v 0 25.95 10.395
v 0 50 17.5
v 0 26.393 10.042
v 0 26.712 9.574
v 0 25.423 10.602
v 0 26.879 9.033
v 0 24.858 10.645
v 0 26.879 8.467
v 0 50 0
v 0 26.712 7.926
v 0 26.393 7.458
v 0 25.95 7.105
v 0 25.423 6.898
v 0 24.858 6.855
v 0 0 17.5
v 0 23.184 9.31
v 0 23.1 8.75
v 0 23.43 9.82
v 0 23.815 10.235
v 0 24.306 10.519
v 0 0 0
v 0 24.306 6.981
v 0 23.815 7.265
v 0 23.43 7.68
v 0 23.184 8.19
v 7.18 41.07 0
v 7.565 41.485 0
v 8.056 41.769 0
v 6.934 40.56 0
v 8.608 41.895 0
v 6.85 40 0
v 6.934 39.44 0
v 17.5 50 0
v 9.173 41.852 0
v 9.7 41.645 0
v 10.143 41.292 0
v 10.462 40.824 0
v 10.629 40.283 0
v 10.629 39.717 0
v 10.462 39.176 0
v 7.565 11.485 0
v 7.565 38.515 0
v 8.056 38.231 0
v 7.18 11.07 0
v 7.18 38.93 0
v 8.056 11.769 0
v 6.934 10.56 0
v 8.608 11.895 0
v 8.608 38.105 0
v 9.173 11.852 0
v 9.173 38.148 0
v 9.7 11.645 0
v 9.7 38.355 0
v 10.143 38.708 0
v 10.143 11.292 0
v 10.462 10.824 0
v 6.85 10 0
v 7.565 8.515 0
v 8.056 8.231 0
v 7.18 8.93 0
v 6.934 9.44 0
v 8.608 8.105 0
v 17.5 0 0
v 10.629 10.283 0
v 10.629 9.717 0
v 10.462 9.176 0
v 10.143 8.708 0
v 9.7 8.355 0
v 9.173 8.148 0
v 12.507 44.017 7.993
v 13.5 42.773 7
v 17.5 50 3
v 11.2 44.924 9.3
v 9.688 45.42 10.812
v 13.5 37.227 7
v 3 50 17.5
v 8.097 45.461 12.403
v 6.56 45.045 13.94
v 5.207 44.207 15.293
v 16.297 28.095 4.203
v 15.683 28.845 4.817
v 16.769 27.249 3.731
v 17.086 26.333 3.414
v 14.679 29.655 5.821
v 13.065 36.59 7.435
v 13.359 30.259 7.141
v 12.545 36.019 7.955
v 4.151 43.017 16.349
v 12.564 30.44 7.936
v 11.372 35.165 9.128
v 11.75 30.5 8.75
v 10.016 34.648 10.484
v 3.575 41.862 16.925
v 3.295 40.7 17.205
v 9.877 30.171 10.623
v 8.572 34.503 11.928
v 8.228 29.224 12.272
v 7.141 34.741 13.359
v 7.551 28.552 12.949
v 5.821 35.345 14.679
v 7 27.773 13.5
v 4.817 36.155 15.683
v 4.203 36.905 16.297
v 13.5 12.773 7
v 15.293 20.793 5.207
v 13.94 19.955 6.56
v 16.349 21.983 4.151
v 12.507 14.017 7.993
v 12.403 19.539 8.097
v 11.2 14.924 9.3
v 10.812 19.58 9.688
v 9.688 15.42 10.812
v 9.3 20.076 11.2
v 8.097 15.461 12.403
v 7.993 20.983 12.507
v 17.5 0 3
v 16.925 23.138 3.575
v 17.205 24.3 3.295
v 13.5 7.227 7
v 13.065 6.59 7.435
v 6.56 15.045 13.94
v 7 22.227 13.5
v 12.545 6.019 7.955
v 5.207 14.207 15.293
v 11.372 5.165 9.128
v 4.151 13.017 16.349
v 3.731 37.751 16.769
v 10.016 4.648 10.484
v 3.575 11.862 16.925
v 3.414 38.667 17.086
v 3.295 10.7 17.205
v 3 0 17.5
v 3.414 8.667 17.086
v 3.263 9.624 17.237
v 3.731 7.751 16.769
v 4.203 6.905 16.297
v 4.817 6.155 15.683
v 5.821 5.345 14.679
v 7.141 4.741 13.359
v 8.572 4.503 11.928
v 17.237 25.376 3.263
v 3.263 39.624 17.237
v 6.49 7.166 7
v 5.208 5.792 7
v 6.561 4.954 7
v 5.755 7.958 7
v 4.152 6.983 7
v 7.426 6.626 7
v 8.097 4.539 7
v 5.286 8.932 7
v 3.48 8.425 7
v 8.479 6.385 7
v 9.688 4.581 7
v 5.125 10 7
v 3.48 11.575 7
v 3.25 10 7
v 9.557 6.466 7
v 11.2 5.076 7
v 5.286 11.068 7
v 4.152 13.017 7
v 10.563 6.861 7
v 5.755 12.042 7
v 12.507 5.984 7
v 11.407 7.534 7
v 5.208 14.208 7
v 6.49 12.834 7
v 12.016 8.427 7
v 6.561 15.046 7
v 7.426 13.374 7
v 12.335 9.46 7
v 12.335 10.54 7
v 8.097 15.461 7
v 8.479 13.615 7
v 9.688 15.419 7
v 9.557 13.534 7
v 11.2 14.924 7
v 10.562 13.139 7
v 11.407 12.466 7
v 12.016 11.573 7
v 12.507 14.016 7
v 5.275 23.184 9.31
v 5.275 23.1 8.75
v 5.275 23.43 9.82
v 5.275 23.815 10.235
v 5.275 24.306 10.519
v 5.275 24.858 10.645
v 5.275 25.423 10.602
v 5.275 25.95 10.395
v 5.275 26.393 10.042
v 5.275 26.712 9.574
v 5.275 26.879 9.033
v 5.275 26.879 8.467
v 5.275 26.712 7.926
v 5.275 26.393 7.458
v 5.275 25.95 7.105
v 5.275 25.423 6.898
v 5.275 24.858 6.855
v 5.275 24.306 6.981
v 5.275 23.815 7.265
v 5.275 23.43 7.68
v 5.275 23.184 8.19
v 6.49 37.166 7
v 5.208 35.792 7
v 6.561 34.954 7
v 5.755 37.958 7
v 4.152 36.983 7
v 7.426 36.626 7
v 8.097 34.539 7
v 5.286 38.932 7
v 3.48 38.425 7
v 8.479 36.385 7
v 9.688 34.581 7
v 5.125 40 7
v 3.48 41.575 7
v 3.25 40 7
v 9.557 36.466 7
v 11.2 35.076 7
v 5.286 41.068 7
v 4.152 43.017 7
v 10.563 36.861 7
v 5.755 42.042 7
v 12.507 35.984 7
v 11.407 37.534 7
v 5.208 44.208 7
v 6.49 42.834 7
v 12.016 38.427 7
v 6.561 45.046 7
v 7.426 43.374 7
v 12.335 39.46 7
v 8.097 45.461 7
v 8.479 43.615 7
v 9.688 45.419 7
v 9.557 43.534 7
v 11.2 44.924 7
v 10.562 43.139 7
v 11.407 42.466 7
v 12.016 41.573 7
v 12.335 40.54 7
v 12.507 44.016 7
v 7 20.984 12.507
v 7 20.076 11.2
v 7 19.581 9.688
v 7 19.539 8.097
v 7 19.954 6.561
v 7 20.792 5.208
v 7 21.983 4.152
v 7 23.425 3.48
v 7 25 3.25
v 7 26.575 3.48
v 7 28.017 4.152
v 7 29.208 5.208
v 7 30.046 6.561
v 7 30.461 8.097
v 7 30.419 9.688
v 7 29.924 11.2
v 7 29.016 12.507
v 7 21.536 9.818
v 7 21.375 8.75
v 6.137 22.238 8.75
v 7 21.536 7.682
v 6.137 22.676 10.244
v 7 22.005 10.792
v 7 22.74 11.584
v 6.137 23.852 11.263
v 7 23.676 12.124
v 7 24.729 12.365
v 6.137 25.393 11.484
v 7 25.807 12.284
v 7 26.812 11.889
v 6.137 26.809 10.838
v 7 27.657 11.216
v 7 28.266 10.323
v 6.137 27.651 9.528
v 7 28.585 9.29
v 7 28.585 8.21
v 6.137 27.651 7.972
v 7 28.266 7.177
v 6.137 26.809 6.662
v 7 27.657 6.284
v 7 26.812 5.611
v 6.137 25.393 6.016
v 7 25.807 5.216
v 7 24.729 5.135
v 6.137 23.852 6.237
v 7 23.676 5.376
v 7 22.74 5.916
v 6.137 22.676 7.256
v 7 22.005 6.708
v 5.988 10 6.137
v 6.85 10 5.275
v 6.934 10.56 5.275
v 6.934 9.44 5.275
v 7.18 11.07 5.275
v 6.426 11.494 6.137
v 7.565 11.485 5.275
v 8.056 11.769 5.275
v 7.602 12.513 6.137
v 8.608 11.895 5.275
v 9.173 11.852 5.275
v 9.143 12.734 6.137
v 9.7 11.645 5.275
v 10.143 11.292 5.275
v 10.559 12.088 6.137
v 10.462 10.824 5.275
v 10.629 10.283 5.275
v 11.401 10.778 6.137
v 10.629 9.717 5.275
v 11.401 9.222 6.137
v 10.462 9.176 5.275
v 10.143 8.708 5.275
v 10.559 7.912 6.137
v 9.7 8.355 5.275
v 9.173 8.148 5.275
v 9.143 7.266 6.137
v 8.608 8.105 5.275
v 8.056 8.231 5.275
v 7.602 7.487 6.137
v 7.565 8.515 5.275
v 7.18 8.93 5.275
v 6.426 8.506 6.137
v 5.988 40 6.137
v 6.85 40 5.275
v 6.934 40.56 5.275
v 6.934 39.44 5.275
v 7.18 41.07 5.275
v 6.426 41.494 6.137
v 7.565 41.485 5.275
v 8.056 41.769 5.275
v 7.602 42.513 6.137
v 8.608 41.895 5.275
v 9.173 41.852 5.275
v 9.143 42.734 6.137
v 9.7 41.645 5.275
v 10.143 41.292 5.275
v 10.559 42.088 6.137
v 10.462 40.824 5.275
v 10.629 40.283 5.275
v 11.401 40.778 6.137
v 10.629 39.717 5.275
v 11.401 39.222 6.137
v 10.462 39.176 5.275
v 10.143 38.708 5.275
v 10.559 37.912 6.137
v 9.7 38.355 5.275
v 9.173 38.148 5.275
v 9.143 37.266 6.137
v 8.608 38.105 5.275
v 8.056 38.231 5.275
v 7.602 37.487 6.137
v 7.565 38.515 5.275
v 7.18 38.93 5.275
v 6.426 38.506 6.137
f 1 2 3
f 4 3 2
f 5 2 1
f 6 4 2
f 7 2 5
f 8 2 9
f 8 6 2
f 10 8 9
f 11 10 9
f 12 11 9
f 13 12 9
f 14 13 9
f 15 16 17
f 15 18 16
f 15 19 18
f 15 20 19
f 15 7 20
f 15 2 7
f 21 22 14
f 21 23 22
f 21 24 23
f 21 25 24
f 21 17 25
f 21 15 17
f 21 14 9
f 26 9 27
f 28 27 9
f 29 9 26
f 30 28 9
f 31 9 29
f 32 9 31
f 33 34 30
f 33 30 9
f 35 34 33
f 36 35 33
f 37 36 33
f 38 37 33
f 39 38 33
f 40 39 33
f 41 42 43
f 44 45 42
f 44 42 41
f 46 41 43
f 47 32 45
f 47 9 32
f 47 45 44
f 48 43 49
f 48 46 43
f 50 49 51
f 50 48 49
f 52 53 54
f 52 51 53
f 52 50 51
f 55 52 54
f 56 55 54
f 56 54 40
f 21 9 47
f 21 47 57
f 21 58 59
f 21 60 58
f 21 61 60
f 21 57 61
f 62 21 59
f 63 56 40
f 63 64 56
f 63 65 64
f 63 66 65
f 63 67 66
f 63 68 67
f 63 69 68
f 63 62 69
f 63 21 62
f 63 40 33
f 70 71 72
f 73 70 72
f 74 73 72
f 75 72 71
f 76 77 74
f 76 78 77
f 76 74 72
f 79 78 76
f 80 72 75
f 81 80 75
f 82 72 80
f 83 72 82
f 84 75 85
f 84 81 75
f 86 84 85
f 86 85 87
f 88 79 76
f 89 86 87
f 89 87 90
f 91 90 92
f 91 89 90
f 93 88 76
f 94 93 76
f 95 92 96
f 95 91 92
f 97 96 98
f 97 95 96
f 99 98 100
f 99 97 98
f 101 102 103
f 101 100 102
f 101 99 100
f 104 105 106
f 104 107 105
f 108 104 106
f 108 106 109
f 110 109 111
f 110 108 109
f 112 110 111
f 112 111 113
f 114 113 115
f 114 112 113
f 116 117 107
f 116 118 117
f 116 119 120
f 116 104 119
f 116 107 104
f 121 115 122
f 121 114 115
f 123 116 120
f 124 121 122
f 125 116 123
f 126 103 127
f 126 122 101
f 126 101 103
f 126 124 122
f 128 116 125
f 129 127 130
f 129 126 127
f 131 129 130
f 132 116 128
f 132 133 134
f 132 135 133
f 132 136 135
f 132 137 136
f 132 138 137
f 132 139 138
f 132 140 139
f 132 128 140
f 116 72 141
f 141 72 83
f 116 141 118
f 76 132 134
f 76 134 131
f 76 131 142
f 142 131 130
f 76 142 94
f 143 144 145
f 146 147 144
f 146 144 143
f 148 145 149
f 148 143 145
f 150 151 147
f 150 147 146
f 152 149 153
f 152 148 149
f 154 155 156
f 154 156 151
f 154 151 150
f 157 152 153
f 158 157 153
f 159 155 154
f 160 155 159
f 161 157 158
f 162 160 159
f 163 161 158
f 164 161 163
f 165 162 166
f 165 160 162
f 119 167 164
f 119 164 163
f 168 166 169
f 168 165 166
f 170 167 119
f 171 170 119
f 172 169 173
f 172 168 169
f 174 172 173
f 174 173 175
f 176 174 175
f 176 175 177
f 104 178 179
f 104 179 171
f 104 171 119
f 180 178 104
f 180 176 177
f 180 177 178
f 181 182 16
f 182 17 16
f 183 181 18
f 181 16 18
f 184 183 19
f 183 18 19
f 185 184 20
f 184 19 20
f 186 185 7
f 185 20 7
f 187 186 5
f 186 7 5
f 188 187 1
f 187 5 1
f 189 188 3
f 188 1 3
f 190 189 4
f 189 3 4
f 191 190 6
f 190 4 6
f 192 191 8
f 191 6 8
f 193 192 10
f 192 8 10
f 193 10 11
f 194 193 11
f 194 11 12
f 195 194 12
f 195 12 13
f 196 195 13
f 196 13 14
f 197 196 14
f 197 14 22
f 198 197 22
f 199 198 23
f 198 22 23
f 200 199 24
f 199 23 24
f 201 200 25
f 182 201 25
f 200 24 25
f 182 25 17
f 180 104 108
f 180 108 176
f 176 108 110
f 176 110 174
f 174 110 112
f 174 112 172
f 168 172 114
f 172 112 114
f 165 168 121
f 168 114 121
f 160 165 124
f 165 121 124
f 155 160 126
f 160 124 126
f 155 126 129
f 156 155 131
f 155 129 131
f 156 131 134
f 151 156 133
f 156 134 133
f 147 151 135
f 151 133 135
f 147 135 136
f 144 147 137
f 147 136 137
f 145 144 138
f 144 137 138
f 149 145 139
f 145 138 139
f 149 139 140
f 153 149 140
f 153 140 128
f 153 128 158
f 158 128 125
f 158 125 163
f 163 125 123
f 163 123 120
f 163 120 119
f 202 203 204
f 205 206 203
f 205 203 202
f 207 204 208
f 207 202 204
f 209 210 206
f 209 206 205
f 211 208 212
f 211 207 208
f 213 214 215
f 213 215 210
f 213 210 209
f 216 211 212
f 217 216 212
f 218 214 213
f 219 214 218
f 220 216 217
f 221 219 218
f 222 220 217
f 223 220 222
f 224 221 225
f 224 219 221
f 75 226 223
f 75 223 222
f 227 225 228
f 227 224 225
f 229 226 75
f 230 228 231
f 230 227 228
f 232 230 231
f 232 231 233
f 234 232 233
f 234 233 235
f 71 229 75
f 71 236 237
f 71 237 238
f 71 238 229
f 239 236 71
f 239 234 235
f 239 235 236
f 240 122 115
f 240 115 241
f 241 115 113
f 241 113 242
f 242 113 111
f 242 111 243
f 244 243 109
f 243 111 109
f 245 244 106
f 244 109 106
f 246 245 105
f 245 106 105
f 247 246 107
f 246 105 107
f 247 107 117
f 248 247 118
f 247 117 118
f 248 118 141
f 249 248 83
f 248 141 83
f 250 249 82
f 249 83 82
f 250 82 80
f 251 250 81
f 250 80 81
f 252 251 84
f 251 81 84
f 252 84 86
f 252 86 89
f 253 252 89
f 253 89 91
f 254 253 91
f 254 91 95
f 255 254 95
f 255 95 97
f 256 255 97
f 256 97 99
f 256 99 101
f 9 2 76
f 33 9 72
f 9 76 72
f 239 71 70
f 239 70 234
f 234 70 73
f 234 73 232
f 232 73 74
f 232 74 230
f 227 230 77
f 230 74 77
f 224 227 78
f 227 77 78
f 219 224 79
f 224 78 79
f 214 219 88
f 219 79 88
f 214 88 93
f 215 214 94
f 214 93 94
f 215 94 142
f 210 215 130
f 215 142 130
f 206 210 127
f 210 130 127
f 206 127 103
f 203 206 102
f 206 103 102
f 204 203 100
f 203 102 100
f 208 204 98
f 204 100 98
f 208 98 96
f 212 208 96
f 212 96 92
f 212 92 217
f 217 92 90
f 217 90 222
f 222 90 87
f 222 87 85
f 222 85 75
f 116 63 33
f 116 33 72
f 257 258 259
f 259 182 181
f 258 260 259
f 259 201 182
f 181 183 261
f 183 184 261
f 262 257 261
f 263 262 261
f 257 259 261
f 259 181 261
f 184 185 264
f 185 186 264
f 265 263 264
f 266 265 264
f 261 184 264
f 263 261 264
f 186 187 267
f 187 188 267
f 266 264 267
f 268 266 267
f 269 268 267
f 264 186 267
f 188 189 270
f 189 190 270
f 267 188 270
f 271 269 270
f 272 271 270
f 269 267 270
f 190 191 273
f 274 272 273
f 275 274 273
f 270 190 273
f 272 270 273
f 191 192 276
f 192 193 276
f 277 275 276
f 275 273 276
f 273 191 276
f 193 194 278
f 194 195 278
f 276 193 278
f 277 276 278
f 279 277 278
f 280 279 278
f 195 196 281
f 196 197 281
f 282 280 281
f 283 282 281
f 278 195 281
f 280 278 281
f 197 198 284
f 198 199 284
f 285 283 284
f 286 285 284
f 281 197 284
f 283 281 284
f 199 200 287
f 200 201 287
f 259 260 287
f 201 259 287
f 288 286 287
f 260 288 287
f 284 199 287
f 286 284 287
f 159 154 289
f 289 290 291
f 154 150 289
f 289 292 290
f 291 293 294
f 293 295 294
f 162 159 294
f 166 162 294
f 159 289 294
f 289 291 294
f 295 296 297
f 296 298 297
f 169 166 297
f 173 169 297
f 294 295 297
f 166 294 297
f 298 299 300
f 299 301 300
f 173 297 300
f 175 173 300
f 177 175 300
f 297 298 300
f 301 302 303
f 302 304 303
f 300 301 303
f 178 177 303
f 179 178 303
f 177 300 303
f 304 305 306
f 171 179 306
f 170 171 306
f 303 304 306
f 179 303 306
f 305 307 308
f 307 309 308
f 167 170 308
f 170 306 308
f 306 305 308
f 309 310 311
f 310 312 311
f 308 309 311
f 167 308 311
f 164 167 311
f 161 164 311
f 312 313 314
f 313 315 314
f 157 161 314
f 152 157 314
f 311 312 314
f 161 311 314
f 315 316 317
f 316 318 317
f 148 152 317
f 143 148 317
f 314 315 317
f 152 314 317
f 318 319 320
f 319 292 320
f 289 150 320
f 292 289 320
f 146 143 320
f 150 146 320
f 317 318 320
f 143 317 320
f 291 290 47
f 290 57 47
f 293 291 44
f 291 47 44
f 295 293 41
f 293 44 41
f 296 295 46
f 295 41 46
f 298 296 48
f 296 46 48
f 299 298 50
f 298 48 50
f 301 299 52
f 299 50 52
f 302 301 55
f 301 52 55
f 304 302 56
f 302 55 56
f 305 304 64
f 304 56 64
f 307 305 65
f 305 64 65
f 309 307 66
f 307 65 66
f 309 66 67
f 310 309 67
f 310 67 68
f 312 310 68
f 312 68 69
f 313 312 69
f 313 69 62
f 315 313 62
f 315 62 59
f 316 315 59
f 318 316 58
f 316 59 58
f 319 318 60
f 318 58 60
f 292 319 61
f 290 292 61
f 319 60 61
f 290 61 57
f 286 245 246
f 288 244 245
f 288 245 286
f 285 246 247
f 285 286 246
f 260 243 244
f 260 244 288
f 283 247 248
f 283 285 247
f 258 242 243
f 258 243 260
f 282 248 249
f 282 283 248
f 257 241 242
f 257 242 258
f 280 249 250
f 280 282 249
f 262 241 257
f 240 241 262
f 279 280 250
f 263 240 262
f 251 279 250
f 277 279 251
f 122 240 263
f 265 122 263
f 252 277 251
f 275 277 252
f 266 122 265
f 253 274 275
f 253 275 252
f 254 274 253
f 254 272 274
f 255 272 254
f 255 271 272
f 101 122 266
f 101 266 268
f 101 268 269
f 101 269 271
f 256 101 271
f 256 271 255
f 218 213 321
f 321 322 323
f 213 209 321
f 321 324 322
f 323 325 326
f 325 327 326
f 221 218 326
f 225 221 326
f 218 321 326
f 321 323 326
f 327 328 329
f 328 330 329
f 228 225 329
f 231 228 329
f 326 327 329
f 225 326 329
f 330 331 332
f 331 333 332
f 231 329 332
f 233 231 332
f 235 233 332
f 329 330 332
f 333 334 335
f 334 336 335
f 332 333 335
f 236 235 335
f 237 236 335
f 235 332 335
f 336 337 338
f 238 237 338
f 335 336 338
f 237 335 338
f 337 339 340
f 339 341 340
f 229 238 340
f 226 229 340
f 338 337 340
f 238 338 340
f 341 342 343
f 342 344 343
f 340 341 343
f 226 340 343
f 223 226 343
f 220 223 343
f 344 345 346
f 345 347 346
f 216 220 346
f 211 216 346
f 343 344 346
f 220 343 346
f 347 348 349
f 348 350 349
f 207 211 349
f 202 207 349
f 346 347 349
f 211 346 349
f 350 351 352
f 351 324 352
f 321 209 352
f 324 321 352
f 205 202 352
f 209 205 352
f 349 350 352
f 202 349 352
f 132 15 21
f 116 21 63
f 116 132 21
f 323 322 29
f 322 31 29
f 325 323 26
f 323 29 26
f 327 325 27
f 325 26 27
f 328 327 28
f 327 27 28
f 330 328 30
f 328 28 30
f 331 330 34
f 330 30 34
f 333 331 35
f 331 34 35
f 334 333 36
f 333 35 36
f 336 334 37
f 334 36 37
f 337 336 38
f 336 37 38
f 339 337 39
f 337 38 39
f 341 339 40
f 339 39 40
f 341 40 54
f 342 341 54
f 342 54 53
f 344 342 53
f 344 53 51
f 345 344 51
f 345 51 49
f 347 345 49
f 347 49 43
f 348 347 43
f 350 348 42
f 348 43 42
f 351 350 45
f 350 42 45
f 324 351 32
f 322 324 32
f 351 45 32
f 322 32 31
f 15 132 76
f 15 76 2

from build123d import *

# Parameters (mm, degrees)
F1_DEPTH        = 50
F3_R            = 5.5
F4_DEPTH        = 10.5
F6_R            = 5.5
F7_DEPTH        = 10.5
F9_D            = 3.8
F9_CSINK_D      = 7.25
F9_CSINK_ANGLE  = 90
F11_D           = 3.8
F11_CSINK_D     = 7.25
F11_CSINK_ANGLE = 90


with BuildPart() as f1:
    # F0 (on Front) → F1 (new body)
    with BuildSketch(Plane.XZ):
        Polygon((3, 17.5), (0, 17.5), (0, 0), (17.5, 0), (17.5, 3), align=None)
    extrude(amount=-F1_DEPTH)

    # F3 (on offset) → F4 (cut)
    with BuildSketch(Plane.XY.offset(17.5)):
        with Locations((8.75, 40)):
            Circle(F3_R)
        with Locations((8.75, 10)):
            Circle(F3_R)
    extrude(amount=-F4_DEPTH, mode=Mode.SUBTRACT)

    # F6 (on offset) → F7 (cut)
    with BuildSketch(Plane.YZ.offset(17.5)):
        with Locations((25, 8.75)):
            Circle(F6_R)
    extrude(amount=-F7_DEPTH, mode=Mode.SUBTRACT)

    # F9 (through all)
    with Locations(Plane.XY.offset(7)):
        with Locations((8.75, 40), (8.75, 10)):
            CounterSinkHole(F9_D / 2, F9_CSINK_D / 2, counter_sink_angle=F9_CSINK_ANGLE)

    # F11 (through all)
    with Locations(Plane.YZ.offset(7)):
        with Locations((25, 8.75)):
            CounterSinkHole(F11_D / 2, F11_CSINK_D / 2, counter_sink_angle=F11_CSINK_ANGLE)


solid = f1.part
